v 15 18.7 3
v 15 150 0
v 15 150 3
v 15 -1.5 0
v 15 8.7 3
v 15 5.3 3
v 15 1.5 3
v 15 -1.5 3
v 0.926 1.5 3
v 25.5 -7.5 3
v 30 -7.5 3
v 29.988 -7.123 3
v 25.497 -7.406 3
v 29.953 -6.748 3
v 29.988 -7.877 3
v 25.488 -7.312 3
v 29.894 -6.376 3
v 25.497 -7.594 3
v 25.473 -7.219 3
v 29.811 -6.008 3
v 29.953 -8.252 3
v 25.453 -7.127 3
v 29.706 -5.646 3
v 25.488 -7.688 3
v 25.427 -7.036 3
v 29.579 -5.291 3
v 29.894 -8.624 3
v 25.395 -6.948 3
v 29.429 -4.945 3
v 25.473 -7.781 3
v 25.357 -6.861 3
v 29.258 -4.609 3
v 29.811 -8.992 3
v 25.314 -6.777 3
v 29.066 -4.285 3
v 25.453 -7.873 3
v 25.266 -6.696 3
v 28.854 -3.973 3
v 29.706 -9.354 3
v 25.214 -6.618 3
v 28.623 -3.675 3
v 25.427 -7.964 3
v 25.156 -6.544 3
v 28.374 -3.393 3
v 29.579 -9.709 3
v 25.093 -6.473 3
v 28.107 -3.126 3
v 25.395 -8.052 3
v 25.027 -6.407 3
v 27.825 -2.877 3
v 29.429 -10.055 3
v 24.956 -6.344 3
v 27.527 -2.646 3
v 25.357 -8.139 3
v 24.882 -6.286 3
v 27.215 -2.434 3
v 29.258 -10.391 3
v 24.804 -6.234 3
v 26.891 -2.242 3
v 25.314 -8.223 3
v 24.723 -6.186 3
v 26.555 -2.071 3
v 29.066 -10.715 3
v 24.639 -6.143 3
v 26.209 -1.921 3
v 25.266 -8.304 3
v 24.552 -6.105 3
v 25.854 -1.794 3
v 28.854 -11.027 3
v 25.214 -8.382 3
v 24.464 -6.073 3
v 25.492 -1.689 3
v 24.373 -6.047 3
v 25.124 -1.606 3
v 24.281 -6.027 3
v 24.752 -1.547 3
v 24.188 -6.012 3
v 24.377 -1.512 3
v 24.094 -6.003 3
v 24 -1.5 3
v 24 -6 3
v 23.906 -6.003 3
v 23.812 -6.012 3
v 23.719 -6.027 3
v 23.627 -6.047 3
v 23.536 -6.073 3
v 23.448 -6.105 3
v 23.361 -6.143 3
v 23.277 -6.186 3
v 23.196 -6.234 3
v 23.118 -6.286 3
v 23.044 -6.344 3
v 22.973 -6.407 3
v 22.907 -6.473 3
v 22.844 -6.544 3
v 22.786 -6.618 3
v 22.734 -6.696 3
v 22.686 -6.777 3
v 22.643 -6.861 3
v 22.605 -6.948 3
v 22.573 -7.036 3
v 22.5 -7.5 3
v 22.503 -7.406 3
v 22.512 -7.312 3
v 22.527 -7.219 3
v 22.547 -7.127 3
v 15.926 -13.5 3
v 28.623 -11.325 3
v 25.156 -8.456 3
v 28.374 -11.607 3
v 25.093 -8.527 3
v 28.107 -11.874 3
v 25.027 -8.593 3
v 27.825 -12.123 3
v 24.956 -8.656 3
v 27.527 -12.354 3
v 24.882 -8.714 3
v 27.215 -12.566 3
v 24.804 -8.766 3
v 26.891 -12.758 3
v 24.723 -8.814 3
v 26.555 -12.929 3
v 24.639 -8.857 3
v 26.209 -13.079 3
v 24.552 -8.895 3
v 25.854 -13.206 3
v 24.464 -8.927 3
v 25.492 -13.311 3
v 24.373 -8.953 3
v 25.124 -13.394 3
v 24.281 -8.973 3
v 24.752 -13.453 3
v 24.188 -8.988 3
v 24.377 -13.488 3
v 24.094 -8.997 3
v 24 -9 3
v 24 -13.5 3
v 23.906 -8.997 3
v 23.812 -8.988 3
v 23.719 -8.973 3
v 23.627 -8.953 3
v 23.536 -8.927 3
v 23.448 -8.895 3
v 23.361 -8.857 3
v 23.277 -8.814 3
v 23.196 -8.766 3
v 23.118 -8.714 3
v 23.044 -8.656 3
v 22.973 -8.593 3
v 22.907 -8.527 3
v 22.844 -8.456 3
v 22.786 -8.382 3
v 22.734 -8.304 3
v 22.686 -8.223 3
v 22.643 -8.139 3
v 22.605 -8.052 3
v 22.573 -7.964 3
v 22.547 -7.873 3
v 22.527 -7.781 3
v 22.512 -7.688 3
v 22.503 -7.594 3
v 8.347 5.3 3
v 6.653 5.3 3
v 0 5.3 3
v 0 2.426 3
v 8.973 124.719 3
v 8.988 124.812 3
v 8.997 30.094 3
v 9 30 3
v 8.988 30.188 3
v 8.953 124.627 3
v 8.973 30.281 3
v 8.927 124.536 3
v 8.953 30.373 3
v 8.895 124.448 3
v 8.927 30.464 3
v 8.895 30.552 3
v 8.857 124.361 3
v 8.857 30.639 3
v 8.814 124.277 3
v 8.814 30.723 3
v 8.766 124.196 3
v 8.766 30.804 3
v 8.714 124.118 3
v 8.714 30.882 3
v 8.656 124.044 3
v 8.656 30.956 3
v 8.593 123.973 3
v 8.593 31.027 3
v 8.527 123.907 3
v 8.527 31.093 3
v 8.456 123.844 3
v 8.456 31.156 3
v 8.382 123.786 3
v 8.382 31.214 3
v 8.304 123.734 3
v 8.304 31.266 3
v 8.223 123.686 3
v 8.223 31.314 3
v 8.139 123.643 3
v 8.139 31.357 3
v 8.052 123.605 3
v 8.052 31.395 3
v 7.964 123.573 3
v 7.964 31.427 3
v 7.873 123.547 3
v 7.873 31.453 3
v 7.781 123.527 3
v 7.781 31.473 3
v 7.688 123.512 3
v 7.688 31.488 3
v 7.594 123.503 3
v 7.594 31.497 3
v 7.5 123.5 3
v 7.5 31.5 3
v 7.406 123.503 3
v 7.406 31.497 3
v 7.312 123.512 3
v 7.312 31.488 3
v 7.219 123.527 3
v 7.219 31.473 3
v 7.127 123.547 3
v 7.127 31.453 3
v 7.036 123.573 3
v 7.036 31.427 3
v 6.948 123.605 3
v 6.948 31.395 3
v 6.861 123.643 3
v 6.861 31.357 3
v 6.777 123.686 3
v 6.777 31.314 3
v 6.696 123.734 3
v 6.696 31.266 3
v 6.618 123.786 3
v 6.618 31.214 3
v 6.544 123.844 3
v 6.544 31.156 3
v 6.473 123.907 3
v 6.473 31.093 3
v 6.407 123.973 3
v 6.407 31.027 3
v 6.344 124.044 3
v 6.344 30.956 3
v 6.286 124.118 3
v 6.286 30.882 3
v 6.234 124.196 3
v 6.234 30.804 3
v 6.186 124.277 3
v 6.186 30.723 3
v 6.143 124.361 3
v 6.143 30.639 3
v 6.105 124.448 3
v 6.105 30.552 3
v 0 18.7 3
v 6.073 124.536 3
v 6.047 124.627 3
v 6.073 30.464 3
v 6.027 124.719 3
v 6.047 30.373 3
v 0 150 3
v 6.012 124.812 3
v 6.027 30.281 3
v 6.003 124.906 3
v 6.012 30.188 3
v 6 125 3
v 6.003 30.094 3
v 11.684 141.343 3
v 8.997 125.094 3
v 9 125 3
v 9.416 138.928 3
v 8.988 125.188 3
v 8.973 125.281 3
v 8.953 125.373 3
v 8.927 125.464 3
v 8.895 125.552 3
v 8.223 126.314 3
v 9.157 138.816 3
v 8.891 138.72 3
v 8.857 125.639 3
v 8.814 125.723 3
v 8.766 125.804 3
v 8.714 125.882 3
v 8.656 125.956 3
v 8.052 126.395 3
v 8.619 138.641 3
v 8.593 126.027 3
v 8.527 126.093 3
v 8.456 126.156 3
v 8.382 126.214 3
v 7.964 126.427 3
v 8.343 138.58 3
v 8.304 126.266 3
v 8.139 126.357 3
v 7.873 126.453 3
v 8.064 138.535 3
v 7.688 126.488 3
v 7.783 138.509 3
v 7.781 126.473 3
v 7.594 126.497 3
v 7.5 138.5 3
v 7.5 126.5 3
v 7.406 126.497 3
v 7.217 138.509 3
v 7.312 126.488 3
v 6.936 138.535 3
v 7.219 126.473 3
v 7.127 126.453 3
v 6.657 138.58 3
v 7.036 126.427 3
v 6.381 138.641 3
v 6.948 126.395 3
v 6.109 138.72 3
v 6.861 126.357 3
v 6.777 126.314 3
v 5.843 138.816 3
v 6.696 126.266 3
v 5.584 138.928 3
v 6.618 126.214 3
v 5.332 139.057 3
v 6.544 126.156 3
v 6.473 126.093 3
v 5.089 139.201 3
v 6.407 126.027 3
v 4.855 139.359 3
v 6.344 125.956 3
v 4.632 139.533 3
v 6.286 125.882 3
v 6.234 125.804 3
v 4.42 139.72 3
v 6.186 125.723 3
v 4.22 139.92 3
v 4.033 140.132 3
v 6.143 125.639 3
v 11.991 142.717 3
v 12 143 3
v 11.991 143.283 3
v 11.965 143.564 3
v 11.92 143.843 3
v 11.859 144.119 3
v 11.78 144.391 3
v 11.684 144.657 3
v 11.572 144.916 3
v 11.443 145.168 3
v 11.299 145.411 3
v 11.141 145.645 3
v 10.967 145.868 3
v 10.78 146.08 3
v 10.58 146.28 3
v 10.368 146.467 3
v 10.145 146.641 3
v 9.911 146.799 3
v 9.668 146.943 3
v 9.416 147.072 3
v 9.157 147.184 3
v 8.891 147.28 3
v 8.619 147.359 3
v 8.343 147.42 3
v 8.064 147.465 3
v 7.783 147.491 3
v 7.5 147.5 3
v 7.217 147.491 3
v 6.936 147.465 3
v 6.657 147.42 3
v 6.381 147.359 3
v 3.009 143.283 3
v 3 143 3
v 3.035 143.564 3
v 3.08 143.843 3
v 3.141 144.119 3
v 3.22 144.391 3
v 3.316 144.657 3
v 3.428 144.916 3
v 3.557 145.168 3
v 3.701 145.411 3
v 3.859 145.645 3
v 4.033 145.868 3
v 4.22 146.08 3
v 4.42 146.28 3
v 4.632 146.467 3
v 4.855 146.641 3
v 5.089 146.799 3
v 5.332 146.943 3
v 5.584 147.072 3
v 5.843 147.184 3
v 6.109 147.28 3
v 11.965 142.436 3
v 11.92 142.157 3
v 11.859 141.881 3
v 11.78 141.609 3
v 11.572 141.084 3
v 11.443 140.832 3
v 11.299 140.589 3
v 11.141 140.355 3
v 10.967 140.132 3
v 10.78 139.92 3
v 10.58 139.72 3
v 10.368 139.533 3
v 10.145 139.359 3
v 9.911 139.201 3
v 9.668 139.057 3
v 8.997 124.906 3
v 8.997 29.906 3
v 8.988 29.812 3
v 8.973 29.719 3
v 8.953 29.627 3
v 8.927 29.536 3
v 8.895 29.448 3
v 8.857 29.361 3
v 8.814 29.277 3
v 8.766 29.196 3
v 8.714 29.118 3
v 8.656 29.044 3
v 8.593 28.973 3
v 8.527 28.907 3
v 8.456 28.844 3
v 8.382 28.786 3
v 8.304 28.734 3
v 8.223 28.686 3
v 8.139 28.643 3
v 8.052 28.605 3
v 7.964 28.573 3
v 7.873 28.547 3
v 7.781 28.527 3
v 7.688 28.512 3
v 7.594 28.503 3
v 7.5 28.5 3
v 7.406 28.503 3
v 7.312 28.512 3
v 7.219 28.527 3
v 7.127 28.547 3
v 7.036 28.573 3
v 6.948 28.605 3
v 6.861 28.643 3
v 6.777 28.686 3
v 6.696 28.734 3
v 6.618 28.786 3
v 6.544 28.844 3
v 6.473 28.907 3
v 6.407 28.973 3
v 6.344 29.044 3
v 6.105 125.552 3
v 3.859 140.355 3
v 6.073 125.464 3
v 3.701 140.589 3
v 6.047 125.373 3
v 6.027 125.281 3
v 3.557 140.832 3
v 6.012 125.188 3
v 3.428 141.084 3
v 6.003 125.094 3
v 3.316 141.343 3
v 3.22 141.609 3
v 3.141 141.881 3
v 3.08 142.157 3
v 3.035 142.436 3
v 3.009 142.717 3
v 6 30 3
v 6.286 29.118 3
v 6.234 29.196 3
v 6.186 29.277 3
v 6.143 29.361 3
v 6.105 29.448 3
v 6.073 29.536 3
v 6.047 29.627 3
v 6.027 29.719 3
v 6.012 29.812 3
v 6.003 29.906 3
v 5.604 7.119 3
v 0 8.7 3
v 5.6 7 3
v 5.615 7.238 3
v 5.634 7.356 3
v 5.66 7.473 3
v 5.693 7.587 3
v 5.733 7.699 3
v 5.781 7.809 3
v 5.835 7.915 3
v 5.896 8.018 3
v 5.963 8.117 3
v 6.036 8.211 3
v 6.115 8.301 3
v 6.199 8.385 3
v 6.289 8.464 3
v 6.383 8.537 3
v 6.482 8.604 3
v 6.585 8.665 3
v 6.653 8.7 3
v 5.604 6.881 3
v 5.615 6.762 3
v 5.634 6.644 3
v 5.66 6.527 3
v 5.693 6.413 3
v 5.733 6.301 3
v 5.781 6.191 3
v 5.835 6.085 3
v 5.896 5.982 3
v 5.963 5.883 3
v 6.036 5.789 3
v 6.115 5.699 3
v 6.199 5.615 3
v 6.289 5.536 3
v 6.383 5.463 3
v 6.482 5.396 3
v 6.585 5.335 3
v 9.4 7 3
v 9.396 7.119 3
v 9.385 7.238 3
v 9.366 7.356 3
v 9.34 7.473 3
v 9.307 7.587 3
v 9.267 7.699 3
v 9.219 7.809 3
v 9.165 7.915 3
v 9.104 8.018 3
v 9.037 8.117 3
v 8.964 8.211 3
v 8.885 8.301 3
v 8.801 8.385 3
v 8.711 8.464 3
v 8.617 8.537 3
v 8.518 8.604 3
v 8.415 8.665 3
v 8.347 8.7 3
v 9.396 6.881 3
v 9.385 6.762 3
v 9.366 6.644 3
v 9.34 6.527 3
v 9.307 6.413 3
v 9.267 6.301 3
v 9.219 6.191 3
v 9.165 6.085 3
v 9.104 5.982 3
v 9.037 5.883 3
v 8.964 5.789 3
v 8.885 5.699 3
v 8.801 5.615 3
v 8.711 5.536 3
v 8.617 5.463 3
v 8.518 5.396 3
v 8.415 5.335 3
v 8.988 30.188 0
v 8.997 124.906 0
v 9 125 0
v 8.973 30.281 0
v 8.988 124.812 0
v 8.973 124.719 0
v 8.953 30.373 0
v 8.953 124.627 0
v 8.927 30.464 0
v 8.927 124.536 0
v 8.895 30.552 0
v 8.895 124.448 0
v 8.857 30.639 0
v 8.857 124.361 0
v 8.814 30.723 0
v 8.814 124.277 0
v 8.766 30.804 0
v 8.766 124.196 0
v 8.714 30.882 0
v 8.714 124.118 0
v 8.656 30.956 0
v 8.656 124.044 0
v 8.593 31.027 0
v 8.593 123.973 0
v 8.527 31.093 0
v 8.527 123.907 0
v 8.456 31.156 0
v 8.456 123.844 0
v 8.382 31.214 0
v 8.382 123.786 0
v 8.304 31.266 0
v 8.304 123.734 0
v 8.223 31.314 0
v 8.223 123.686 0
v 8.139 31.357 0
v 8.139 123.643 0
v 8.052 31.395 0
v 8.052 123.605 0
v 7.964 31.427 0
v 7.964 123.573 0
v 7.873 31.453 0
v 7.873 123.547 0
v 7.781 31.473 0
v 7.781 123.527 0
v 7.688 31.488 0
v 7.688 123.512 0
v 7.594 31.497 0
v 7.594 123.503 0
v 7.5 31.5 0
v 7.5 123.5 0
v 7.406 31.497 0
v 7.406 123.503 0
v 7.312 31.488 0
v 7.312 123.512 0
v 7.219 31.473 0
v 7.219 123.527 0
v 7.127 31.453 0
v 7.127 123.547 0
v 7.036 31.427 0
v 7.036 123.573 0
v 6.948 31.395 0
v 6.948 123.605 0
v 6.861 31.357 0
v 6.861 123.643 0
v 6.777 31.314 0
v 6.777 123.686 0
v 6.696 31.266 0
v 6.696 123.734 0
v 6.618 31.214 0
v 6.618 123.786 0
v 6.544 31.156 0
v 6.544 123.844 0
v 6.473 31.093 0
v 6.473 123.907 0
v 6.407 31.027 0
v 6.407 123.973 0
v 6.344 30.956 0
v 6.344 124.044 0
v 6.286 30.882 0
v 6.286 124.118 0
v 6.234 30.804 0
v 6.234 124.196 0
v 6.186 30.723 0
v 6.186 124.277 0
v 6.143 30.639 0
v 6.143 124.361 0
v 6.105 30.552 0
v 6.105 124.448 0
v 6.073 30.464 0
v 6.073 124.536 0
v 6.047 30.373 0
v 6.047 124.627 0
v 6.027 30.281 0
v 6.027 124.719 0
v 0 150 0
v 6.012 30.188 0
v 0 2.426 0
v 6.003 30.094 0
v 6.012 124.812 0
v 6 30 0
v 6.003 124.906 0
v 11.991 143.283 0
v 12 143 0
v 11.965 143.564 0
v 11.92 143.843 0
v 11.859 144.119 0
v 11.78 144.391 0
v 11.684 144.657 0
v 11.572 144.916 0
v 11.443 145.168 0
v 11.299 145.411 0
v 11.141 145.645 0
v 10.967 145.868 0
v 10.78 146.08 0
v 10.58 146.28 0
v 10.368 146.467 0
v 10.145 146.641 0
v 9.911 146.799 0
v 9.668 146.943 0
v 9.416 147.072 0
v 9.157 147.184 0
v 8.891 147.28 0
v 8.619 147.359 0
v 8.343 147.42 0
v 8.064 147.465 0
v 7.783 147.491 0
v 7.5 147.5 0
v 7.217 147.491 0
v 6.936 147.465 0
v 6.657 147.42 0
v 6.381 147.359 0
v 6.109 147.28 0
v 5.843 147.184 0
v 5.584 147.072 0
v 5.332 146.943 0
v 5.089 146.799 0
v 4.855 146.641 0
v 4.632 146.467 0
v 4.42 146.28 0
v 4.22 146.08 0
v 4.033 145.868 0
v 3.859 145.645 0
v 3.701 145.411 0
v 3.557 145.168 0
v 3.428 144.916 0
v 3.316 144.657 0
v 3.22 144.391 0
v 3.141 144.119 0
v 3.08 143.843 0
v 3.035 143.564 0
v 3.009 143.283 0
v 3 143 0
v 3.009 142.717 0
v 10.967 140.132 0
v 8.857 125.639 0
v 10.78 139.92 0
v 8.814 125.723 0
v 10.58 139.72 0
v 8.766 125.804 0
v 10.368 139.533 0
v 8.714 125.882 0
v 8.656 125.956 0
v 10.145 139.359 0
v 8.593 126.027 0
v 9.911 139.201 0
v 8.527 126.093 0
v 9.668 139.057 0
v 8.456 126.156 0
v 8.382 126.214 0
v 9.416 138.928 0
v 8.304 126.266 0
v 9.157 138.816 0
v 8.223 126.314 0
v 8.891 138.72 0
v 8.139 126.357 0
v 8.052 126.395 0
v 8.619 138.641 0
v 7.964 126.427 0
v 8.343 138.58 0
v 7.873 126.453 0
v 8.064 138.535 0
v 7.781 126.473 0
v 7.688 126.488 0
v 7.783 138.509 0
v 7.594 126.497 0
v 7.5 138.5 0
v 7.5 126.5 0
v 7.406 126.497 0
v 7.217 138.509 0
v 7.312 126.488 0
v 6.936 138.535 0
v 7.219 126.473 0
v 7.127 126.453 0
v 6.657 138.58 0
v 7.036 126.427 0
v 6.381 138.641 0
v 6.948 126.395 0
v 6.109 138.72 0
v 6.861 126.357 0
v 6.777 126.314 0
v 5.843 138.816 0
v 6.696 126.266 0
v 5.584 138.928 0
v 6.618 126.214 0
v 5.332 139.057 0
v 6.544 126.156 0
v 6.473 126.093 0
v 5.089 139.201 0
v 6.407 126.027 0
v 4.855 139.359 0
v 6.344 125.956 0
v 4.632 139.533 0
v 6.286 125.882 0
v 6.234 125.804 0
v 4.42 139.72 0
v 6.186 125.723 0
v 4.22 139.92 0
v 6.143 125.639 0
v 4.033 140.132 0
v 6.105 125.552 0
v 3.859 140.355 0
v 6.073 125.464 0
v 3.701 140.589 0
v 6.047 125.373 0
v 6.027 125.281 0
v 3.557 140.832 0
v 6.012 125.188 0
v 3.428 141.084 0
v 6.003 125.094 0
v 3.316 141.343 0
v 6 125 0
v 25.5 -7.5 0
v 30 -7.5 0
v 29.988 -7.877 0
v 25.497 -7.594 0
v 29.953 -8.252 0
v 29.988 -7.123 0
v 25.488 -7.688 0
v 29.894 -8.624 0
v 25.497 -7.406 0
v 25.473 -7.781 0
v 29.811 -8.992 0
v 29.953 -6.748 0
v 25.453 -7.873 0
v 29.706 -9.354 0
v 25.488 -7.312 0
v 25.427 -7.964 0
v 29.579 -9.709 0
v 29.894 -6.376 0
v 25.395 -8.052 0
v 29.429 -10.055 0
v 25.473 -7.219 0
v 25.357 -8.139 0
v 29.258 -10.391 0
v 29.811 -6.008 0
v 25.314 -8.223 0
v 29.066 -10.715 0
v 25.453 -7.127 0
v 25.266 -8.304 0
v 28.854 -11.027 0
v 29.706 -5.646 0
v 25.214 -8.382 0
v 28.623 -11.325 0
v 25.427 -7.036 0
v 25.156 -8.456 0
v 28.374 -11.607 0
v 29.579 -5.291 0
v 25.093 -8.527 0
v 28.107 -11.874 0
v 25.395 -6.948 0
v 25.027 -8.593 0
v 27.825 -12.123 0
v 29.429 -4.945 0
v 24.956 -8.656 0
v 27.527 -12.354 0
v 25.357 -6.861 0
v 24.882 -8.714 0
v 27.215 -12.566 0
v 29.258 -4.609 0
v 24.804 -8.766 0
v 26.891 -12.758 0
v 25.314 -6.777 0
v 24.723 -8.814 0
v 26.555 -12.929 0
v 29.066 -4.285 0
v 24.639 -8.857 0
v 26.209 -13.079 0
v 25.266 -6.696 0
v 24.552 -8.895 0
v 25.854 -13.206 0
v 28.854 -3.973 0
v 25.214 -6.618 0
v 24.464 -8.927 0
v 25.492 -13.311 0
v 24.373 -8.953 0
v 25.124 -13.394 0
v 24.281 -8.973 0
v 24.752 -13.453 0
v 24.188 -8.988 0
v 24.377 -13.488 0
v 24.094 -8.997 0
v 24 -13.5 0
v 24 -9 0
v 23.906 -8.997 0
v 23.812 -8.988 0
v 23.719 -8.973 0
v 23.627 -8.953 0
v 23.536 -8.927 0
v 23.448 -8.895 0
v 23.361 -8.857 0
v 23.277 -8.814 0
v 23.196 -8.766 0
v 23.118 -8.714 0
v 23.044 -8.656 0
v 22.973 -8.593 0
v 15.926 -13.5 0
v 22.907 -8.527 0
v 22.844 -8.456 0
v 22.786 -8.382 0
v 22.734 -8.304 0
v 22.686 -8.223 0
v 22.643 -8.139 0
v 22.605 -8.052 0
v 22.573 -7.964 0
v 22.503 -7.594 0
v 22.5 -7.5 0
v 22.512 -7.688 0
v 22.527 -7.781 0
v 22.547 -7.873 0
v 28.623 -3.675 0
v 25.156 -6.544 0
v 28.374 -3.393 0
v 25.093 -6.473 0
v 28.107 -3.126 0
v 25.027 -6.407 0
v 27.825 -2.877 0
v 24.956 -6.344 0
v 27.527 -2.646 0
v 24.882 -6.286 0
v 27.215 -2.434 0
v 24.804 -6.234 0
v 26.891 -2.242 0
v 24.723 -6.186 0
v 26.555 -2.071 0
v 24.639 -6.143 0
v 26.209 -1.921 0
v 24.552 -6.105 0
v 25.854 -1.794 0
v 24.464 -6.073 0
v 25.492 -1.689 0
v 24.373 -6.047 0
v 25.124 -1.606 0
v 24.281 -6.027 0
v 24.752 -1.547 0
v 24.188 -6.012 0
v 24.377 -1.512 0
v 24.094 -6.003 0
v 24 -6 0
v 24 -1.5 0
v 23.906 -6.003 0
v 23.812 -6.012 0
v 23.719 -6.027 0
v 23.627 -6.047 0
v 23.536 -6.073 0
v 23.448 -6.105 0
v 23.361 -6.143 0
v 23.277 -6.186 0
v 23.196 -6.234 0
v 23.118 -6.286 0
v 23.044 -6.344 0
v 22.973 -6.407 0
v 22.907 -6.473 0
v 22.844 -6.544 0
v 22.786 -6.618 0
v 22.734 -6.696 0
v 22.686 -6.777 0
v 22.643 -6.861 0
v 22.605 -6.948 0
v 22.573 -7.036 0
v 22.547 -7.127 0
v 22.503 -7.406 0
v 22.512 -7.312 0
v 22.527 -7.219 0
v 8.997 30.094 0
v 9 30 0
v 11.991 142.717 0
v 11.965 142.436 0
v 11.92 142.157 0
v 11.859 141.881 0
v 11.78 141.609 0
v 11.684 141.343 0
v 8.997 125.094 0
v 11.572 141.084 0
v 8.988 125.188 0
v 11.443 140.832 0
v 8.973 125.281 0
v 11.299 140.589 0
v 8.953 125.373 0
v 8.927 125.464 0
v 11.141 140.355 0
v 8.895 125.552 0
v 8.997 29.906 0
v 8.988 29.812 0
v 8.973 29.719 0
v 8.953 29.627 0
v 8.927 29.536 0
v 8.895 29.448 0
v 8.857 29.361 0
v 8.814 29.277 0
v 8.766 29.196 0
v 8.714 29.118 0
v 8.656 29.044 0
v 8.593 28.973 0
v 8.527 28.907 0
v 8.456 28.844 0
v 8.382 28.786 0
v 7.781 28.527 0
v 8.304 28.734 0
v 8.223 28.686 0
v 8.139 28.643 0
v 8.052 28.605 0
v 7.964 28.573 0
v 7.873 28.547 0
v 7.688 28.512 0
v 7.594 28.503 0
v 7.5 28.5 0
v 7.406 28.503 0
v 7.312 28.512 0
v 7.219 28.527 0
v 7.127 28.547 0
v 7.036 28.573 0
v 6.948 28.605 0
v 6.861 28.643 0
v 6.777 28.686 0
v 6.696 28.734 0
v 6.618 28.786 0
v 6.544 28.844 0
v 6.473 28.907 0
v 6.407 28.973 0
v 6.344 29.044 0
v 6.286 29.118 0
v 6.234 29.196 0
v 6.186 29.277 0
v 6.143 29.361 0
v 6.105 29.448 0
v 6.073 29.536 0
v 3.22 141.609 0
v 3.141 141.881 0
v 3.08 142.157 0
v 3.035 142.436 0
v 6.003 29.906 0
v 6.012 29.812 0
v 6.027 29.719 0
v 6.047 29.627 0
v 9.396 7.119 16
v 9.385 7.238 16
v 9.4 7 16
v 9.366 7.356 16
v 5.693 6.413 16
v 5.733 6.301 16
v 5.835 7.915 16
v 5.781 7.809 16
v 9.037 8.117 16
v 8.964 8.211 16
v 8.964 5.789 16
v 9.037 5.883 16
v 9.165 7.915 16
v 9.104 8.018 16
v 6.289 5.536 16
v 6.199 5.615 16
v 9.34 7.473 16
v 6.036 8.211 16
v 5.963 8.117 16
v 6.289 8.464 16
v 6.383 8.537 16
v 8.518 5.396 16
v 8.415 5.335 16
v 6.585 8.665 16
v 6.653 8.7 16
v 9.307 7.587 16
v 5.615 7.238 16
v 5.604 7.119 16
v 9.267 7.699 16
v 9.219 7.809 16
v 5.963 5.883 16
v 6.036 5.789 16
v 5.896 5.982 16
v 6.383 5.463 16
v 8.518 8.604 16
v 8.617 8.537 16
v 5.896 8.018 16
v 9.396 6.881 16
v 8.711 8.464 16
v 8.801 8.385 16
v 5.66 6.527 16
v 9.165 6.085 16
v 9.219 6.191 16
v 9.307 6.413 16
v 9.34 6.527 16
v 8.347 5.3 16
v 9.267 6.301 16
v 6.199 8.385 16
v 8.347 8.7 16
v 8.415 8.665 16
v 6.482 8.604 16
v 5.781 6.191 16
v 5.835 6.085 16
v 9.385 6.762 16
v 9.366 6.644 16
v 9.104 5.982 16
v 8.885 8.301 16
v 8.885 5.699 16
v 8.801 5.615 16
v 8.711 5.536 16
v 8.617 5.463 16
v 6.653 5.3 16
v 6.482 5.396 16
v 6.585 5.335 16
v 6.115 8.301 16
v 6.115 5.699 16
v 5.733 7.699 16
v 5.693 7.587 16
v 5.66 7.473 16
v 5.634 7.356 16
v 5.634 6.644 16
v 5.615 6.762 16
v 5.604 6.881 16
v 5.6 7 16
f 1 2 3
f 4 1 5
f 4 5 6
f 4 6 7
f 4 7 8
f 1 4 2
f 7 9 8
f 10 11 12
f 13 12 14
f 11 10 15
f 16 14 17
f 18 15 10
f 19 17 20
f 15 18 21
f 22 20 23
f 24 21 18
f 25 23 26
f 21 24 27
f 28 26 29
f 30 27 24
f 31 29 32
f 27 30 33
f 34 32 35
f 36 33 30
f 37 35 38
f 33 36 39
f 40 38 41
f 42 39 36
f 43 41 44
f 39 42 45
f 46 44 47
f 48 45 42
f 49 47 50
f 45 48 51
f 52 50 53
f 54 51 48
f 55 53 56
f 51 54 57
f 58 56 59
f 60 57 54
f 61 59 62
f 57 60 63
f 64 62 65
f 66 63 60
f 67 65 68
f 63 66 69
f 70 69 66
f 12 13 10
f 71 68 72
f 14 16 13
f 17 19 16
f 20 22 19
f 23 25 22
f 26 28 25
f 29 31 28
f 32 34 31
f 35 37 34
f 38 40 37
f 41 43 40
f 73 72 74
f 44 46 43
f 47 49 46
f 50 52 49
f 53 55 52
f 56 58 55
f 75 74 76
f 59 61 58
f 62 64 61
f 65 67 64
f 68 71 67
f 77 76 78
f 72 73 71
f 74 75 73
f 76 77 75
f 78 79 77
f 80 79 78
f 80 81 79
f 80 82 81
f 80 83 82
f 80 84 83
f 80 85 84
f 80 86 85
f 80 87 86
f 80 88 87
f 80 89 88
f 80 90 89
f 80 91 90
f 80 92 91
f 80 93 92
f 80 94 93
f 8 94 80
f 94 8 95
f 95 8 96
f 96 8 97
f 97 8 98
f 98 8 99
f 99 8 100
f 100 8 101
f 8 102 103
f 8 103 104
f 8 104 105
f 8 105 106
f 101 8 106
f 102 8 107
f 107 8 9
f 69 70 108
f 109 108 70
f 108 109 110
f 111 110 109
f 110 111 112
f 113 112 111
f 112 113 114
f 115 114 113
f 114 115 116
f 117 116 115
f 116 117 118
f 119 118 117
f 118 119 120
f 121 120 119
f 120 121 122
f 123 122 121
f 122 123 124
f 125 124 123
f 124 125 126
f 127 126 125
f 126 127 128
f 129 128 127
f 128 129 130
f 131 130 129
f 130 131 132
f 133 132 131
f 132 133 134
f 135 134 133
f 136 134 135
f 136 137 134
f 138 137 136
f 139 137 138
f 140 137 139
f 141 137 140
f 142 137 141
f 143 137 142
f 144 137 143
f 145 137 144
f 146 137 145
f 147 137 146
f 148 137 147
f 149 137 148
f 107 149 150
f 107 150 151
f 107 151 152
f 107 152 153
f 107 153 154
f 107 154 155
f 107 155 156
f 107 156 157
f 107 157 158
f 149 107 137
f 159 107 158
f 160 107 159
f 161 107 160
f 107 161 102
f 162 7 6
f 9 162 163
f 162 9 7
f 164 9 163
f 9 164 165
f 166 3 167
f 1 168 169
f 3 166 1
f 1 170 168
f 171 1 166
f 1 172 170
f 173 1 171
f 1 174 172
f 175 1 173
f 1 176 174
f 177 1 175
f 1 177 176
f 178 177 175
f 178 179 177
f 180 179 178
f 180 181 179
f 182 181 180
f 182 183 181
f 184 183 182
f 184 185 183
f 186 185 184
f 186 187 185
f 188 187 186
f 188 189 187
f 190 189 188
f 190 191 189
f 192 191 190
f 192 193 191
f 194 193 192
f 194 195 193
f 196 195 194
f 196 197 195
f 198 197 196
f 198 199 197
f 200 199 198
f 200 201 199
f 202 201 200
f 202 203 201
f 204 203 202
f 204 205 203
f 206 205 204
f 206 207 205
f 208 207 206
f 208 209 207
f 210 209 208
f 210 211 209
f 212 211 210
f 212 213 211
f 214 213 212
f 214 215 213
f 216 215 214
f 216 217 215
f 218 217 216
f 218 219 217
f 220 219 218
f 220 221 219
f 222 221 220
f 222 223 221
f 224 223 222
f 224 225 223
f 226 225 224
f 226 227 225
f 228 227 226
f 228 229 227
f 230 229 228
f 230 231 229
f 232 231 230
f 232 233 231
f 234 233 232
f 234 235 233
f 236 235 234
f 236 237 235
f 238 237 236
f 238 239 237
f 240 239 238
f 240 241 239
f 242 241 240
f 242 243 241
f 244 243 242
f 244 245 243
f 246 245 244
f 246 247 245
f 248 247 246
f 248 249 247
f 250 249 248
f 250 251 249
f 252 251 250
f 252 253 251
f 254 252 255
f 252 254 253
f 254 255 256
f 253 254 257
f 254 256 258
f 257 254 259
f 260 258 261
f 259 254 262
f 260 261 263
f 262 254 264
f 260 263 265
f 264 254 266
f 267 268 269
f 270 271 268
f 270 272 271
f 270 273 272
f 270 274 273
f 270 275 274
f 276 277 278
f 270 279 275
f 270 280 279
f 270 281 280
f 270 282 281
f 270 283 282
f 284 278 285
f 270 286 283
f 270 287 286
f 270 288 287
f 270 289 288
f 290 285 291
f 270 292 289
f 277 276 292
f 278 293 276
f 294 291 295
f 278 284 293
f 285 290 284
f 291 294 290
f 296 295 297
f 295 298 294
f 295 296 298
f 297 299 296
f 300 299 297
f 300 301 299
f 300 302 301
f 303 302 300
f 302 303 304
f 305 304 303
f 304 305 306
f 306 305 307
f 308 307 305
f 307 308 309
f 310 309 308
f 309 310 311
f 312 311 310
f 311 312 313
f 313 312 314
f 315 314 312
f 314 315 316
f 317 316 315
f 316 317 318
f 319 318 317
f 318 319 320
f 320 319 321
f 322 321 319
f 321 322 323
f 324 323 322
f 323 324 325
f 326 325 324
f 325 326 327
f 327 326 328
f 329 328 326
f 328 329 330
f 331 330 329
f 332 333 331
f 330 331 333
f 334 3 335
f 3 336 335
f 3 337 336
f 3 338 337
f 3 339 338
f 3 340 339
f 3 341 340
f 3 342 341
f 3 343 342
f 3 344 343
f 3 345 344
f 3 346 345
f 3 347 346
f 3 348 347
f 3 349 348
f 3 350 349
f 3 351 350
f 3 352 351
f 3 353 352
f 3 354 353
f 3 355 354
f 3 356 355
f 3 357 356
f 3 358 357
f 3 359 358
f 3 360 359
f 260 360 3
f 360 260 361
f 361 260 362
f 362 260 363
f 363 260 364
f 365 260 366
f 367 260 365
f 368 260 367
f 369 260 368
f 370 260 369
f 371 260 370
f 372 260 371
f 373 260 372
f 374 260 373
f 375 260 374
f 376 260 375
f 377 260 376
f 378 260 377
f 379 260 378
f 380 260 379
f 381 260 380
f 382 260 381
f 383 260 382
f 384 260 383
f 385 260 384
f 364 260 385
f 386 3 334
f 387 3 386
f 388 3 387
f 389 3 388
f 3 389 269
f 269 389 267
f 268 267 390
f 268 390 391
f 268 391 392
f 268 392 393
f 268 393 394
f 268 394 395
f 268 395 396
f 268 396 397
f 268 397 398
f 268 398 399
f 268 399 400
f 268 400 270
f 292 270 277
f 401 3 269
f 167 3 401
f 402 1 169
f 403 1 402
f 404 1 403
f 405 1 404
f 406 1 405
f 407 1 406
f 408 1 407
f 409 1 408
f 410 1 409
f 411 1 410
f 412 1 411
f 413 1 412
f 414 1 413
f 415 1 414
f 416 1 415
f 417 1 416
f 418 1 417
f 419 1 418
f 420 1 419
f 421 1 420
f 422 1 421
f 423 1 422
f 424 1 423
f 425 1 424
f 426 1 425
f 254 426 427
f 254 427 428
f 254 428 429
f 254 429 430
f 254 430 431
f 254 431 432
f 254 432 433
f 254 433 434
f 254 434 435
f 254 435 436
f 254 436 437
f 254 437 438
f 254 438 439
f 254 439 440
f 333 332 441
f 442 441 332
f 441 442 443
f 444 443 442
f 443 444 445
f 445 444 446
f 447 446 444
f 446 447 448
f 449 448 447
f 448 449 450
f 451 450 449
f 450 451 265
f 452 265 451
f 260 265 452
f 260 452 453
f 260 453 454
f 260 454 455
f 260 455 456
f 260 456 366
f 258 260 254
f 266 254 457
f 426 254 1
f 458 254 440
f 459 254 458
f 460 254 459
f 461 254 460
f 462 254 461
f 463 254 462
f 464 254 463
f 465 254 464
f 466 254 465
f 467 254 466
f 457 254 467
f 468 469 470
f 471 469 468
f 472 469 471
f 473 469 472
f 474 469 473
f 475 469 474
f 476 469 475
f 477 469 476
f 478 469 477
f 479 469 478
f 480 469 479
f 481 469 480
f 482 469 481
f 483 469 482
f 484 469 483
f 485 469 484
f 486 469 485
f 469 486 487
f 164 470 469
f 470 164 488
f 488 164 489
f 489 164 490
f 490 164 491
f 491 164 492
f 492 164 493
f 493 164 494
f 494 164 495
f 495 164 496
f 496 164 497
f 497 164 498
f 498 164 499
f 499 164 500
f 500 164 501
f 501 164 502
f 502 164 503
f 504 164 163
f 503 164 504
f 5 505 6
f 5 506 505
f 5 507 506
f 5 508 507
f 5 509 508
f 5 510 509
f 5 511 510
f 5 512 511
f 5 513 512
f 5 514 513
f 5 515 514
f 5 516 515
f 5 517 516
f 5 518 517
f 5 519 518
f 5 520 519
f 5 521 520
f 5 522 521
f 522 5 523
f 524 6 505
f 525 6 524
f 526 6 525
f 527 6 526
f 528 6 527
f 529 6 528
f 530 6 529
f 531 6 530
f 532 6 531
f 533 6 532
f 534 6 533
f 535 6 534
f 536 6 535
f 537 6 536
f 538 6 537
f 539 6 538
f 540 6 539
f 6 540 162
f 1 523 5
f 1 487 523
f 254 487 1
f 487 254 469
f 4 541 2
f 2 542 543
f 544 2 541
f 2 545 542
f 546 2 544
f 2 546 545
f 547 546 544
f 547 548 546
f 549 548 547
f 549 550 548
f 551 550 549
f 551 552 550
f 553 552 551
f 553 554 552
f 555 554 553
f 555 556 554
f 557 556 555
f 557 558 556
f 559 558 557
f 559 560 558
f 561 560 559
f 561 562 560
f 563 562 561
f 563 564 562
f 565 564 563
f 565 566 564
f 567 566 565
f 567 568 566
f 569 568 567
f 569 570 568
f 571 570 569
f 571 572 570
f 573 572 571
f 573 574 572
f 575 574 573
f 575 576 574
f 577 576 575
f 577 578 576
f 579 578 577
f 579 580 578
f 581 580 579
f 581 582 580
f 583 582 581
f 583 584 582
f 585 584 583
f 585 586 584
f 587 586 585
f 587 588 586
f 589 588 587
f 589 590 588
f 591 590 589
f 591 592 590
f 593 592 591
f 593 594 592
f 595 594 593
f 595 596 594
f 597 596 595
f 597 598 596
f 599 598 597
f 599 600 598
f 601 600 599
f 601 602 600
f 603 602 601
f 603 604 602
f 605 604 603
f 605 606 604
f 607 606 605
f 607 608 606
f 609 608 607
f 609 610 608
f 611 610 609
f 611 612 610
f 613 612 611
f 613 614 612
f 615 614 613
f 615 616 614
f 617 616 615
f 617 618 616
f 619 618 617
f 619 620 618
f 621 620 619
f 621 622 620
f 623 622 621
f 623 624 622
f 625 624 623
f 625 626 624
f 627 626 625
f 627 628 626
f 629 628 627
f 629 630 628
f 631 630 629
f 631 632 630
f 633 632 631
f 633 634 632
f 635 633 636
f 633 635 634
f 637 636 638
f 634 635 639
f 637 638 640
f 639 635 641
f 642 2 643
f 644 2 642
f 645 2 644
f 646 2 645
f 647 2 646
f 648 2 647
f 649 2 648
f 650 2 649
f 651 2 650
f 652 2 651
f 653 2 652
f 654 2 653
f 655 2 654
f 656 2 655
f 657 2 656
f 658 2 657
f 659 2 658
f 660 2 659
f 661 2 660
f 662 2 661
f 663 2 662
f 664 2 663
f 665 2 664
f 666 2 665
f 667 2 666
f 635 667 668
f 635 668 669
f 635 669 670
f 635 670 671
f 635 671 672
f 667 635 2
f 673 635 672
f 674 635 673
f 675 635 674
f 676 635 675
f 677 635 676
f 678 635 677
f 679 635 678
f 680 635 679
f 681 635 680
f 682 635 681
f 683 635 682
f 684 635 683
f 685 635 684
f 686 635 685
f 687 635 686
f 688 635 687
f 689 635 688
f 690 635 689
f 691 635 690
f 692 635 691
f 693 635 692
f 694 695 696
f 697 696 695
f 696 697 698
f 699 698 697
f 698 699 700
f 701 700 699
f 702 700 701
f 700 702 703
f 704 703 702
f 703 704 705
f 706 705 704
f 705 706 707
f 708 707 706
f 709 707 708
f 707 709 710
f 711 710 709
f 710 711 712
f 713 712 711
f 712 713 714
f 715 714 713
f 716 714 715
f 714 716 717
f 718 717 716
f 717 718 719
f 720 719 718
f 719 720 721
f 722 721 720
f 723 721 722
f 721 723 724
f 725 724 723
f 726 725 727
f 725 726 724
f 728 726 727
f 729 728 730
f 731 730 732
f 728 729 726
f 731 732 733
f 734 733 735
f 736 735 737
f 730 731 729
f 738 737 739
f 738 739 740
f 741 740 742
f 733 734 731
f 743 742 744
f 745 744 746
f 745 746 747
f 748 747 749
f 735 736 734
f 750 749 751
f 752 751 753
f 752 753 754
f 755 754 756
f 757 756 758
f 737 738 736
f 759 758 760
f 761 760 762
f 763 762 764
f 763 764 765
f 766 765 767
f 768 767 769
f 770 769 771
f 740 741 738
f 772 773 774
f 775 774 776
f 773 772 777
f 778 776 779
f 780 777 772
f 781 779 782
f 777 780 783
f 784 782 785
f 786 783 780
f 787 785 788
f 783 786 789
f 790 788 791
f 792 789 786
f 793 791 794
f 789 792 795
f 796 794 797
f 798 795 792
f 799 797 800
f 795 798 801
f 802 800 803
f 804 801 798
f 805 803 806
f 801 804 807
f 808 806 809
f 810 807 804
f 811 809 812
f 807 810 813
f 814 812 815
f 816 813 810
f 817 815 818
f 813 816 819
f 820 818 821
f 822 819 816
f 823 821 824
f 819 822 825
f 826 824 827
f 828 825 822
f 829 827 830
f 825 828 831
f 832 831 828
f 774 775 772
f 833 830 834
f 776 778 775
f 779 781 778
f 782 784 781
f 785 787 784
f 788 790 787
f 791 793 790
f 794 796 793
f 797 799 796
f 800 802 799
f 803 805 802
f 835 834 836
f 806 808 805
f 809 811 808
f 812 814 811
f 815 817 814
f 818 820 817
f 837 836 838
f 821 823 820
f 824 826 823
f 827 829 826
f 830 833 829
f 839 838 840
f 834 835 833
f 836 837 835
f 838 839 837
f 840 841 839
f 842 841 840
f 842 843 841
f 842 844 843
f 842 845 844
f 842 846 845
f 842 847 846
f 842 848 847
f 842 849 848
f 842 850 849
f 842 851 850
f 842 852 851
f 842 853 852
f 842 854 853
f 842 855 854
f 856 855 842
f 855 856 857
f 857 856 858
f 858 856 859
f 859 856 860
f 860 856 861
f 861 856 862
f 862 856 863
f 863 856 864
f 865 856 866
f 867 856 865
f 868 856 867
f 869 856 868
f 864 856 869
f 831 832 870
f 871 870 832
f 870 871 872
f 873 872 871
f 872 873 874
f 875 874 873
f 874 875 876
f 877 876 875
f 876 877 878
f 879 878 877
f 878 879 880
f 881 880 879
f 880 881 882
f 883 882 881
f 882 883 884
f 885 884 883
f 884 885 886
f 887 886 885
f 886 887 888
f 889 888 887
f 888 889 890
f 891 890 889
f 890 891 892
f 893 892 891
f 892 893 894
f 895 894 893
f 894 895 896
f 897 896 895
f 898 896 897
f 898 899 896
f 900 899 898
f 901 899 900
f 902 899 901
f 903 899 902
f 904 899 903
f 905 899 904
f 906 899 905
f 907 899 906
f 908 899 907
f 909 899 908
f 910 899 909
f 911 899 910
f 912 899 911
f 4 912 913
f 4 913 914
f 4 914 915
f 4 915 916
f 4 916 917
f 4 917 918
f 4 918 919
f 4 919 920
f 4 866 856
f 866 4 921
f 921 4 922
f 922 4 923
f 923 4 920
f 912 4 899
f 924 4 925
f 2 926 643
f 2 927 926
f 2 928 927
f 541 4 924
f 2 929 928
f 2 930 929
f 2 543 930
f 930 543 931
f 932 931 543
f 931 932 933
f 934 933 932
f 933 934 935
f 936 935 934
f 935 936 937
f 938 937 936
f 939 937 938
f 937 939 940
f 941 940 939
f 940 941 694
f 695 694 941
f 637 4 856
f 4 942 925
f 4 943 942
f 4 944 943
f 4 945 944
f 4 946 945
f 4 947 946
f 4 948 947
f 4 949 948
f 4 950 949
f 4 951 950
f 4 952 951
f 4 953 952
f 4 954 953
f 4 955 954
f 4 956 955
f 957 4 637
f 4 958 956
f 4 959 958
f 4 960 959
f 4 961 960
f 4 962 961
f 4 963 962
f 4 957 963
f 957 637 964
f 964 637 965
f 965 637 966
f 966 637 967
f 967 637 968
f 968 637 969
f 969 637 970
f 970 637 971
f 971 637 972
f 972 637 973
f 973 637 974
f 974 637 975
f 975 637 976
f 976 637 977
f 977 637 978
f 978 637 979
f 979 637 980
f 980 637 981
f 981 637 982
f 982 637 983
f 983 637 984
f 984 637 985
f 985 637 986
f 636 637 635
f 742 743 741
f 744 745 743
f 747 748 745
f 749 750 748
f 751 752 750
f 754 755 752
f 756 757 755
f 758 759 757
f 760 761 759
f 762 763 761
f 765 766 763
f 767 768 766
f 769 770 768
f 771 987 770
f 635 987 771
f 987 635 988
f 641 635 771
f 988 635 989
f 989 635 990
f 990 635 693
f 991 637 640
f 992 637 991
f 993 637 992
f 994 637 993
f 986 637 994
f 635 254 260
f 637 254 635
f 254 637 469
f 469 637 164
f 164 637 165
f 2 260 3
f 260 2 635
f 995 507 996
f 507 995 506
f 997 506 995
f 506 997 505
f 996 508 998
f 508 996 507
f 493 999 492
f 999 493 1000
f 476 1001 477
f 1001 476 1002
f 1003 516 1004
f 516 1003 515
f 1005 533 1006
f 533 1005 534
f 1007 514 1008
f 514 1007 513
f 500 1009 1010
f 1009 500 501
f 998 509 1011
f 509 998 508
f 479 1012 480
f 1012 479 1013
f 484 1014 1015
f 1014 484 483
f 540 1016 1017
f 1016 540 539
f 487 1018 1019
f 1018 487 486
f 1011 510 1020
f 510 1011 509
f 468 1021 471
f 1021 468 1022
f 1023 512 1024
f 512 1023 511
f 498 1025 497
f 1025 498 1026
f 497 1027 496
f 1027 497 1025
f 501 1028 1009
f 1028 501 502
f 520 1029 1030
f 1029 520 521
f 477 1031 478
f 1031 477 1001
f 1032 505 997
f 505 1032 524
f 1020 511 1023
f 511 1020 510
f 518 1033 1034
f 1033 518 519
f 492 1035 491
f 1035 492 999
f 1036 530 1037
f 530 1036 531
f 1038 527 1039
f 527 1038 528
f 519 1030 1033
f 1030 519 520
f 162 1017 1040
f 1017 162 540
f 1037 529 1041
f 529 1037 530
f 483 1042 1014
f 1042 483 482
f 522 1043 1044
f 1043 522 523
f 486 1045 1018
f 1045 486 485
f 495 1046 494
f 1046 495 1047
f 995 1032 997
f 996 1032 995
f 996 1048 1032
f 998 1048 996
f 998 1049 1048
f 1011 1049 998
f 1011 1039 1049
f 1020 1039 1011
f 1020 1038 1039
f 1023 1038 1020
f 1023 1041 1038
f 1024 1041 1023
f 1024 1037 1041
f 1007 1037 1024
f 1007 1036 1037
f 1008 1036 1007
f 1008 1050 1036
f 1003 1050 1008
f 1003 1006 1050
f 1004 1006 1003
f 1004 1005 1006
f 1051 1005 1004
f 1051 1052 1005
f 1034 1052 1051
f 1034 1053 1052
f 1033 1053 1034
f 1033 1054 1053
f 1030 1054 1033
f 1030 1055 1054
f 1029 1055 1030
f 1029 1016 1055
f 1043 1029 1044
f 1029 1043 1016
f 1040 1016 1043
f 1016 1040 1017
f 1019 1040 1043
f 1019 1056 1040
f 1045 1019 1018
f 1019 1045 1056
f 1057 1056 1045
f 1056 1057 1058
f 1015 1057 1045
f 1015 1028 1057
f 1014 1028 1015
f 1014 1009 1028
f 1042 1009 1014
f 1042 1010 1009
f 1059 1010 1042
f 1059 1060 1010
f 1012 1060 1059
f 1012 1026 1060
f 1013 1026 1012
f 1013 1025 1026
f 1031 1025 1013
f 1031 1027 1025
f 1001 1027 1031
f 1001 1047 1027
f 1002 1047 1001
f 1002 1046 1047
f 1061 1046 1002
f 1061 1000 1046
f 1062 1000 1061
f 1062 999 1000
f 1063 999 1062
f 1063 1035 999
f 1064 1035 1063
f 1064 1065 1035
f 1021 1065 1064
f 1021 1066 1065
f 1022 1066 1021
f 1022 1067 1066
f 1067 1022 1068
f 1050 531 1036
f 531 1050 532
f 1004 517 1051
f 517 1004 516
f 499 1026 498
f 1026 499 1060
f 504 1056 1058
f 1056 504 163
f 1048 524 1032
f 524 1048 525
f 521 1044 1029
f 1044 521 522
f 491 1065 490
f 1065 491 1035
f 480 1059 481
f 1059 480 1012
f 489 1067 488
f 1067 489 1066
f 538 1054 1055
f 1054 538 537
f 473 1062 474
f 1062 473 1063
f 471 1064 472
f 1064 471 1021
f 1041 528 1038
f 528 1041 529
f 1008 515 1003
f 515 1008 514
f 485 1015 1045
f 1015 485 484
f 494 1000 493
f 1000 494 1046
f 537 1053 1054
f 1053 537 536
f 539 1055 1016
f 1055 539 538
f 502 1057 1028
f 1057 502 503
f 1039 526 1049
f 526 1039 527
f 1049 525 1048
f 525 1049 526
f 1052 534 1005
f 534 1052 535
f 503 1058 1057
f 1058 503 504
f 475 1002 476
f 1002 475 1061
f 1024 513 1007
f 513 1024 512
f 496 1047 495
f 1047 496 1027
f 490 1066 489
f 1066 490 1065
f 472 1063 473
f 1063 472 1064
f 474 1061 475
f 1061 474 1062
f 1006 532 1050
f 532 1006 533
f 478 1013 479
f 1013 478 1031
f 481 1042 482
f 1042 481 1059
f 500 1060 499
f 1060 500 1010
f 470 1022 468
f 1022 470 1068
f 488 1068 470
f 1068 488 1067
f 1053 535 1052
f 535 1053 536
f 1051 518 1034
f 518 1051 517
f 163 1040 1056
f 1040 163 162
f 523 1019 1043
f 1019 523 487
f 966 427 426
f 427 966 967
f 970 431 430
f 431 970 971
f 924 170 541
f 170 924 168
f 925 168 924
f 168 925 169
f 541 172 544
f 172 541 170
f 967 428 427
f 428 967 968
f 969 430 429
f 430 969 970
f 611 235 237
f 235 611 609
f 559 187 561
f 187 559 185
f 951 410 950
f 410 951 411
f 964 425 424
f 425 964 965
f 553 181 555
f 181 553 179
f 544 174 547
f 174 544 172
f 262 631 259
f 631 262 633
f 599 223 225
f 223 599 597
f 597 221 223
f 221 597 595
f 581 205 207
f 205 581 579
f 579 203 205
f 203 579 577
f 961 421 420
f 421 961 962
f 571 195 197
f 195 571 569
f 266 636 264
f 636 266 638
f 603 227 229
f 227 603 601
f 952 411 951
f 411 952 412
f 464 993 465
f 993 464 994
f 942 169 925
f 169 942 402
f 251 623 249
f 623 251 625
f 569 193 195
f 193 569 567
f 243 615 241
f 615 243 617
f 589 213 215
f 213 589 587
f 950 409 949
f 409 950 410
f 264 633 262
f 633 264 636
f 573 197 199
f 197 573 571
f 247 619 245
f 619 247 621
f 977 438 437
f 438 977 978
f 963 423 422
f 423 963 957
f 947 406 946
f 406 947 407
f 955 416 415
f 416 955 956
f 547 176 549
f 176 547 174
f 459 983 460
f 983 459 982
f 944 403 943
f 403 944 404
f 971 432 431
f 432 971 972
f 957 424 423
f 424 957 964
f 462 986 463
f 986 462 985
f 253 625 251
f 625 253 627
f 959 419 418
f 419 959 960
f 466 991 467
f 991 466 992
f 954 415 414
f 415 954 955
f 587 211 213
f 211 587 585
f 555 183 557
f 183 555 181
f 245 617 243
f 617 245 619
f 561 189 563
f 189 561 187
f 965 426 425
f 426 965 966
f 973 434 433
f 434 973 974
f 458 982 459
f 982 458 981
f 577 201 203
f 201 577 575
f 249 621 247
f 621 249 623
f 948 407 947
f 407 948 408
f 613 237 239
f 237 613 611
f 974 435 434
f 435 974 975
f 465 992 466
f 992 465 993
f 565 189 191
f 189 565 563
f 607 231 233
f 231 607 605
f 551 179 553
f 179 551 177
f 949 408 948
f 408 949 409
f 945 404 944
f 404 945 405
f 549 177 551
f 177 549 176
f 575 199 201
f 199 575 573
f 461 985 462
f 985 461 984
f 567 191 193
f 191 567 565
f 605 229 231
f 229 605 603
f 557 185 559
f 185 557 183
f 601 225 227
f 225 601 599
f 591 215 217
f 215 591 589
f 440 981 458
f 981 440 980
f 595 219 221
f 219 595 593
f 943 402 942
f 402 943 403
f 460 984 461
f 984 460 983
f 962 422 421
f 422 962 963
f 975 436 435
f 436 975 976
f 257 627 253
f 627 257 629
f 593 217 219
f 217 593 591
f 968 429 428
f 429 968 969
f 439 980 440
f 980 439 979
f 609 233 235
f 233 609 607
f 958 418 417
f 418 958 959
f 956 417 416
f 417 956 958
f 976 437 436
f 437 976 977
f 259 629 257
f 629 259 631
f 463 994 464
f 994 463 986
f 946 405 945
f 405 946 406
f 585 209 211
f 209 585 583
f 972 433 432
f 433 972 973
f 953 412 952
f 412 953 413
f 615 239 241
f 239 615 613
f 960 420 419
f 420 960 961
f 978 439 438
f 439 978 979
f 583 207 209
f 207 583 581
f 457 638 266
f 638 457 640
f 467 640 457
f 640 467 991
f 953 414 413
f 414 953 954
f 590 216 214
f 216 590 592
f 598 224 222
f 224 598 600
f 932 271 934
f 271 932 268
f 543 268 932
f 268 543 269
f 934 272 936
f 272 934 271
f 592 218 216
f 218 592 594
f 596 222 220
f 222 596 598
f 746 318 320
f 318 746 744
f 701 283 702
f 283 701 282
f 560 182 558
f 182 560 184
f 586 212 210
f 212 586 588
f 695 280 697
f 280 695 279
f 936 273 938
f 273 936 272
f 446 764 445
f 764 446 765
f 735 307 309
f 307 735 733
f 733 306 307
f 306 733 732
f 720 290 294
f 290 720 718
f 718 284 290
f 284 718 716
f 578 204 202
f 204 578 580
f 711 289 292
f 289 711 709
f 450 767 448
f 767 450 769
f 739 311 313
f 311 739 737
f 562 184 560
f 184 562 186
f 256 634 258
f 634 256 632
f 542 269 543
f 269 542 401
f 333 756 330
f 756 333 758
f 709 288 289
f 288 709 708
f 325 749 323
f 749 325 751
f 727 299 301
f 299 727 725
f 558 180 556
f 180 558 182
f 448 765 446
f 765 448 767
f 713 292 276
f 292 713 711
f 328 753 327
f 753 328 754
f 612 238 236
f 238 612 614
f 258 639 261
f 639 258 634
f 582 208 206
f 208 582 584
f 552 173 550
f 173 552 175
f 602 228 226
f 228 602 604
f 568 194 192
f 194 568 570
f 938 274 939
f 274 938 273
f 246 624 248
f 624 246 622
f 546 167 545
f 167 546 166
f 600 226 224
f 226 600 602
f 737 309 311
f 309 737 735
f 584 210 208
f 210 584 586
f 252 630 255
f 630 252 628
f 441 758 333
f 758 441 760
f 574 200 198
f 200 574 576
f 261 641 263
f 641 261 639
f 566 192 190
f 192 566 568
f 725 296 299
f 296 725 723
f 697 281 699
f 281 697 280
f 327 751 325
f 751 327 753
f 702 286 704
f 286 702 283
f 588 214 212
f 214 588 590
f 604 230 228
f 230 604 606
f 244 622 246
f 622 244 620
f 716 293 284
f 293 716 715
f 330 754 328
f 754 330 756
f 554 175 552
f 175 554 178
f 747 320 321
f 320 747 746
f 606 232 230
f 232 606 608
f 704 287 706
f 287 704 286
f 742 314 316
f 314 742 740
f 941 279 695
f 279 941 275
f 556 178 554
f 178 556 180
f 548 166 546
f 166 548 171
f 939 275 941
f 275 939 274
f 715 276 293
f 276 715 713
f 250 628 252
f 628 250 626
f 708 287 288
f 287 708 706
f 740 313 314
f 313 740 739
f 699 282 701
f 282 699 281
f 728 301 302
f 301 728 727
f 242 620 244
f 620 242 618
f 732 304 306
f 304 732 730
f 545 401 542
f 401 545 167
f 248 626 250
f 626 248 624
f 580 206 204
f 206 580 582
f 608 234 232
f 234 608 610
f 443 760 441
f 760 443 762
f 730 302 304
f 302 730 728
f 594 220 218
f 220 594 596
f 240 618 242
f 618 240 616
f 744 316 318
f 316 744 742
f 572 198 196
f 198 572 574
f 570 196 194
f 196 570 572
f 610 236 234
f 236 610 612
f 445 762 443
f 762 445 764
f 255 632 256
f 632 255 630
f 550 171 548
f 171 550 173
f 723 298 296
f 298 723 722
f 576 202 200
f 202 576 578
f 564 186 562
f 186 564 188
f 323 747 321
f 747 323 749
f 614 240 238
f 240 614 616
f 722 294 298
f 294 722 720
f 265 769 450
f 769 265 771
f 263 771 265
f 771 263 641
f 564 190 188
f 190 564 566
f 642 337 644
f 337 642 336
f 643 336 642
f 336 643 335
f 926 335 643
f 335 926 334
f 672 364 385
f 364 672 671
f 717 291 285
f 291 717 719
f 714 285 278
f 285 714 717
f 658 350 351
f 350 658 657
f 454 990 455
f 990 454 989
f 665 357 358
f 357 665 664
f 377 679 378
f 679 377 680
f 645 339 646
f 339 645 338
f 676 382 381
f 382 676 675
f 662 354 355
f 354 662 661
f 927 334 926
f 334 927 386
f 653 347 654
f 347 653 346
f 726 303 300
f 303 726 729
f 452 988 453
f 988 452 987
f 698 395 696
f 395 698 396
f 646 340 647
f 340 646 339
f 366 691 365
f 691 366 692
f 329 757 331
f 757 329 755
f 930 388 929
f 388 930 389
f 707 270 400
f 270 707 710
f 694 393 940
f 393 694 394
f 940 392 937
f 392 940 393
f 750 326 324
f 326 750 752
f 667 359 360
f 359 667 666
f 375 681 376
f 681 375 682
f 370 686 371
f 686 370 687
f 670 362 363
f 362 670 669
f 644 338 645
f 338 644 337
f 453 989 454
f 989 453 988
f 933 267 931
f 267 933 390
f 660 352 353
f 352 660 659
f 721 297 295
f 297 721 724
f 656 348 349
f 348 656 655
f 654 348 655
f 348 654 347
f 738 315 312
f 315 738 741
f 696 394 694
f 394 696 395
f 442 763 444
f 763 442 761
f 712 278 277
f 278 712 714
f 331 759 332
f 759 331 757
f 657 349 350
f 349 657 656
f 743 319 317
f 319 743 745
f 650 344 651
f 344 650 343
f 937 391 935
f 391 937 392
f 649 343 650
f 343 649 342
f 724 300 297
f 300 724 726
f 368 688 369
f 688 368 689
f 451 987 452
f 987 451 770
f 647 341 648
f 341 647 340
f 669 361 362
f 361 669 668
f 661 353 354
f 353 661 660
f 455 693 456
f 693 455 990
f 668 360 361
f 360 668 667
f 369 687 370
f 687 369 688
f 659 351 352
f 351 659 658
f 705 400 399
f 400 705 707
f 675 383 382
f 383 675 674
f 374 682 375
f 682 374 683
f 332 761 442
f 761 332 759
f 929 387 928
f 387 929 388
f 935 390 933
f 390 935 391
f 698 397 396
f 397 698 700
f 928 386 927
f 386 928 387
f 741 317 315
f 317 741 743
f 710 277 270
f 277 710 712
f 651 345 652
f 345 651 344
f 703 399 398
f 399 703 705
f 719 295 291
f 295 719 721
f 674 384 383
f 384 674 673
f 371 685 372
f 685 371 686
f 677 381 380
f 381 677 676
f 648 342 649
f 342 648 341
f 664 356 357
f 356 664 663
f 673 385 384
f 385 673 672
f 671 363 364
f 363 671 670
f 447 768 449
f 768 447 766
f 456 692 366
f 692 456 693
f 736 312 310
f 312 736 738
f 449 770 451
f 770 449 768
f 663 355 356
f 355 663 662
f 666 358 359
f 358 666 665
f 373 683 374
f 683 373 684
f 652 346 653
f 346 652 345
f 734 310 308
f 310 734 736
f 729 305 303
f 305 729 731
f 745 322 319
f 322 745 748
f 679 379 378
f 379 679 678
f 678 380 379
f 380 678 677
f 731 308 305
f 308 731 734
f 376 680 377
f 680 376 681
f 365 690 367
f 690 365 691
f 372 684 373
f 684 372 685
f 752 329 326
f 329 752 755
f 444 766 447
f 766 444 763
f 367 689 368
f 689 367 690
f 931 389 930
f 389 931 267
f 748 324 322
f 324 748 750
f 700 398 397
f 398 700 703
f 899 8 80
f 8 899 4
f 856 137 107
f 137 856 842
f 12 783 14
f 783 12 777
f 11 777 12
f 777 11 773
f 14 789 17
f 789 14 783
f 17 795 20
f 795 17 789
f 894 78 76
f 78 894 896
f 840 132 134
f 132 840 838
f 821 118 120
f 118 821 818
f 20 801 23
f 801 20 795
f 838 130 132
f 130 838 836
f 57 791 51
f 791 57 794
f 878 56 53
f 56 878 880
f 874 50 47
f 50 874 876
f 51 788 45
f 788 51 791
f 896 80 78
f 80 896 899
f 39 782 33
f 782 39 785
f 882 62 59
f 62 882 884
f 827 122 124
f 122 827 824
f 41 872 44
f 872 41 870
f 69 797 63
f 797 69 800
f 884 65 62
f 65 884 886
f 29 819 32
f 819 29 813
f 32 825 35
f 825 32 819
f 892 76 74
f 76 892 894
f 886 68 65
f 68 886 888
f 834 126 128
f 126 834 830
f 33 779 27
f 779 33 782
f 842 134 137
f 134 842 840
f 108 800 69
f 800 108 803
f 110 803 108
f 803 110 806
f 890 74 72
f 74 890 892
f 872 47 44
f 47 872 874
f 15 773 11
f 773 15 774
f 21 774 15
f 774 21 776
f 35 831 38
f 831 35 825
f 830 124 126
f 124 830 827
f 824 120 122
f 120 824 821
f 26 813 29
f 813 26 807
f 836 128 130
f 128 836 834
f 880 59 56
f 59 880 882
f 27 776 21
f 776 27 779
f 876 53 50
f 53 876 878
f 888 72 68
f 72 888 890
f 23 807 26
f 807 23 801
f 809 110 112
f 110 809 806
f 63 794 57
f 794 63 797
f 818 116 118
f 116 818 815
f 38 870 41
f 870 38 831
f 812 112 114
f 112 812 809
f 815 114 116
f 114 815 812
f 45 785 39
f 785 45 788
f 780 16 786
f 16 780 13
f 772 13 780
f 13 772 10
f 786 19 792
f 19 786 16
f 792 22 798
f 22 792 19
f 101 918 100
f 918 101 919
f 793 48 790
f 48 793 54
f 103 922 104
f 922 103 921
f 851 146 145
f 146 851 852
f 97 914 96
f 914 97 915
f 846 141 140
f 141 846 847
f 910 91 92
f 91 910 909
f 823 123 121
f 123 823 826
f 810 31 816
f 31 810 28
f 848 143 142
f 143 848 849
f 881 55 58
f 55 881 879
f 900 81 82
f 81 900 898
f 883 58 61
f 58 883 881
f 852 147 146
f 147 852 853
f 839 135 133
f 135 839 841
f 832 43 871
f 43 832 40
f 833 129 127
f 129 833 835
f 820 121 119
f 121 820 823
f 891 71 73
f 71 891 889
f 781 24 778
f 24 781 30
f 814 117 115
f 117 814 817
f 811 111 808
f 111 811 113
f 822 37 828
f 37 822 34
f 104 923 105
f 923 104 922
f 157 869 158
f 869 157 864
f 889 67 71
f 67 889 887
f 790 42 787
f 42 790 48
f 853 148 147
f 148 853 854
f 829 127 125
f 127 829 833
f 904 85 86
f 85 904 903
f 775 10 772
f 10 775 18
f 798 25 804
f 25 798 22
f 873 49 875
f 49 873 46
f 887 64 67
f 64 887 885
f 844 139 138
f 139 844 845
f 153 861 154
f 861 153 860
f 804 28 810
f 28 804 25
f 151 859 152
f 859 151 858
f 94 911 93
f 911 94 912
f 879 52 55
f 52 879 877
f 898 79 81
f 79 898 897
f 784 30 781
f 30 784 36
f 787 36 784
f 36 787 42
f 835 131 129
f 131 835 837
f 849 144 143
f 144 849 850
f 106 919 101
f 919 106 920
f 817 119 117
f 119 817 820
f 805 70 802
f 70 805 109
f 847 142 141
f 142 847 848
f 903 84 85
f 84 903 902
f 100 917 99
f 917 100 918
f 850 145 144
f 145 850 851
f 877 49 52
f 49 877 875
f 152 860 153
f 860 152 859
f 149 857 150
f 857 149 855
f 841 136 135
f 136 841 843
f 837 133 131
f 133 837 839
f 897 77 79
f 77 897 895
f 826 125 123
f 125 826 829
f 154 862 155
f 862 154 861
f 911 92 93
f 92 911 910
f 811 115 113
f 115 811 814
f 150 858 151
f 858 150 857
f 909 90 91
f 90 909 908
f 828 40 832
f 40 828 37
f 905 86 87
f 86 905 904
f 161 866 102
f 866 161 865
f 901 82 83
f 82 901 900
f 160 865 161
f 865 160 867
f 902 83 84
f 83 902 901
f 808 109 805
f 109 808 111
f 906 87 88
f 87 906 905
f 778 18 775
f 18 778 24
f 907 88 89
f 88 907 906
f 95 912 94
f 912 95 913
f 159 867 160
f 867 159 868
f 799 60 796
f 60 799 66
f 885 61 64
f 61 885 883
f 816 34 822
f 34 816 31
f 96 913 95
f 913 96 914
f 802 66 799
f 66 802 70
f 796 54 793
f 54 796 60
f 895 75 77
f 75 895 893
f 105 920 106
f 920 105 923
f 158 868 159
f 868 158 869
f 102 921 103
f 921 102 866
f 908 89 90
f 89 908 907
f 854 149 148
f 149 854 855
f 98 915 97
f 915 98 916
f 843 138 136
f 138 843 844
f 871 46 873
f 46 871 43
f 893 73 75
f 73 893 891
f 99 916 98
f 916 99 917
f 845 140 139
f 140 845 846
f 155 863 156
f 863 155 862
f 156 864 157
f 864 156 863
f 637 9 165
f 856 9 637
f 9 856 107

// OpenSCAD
difference(){
	union(){        
        lengte = 150;
        dikte = 3;

difference(){
	union(){   
        
        translate([0,0,0]){
           cube([15,lengte,dikte], center=false);
        }
     
        translate([7.5,7,0]){
            rotate(a = [0,0,0]) {
                cylinder(h=16, r=1.9, $fn=100, center=false);
            }
        }	

        
	}
	union() {
/* hoekjes van potmeter as */
        translate([0,-4.7,3]){
           cube([20,10,20], center=false);
        }
        translate([0,8.7,3]){
           cube([20,10,20], center=false);
        }

/* gaten in as */
        translate([7.5,30,-10]){
            rotate(a = [0,0,0]) {
                cylinder(h=400, r=1.5, $fn=100, center=false);
            }
        }	
        translate([7.5,lengte-25,-10]){
            rotate(a = [0,0,0]) {
                cylinder(h=400, r=1.5, $fn=100, center=false);
            }
        }	

        



/* gat voor lager */
        translate([7.5,lengte-7,-10]){
            rotate(a = [0,0,0]) {
                cylinder(h=400, r=4.5, $fn=100, center=false);
            }
        }	
/*
        translate([7.5,7,-10]){
            rotate(a = [0,0,0]) {
                cylinder(h=400, r=3.8, $fn=100, center=false);
            }
        }	
*/
	}
}


        translate([0,-13.5,0]){
           cube([24,12,dikte], center=false);
        }
        translate([0,-13.5,0]){
           cube([15,15,dikte], center=false);
        }
        
        translate([24,-7.5,0]){
            rotate(a = [0,0,0]) {
                cylinder(h=dikte, r=6, $fn=100, center=false);
            }
        }	



        
	}
	union() {

/* gat voor lager */
        translate([24,-7.5,-10]){
            rotate(a = [0,0,0]) {
                cylinder(h=400, r=1.5, $fn=100, center=false);
            }
        }	

        translate([0,-40,-10]){
           rotate(a = [0,0,45]) {
            cube([30,30,20], center=false);
           }
        }

	}
}
